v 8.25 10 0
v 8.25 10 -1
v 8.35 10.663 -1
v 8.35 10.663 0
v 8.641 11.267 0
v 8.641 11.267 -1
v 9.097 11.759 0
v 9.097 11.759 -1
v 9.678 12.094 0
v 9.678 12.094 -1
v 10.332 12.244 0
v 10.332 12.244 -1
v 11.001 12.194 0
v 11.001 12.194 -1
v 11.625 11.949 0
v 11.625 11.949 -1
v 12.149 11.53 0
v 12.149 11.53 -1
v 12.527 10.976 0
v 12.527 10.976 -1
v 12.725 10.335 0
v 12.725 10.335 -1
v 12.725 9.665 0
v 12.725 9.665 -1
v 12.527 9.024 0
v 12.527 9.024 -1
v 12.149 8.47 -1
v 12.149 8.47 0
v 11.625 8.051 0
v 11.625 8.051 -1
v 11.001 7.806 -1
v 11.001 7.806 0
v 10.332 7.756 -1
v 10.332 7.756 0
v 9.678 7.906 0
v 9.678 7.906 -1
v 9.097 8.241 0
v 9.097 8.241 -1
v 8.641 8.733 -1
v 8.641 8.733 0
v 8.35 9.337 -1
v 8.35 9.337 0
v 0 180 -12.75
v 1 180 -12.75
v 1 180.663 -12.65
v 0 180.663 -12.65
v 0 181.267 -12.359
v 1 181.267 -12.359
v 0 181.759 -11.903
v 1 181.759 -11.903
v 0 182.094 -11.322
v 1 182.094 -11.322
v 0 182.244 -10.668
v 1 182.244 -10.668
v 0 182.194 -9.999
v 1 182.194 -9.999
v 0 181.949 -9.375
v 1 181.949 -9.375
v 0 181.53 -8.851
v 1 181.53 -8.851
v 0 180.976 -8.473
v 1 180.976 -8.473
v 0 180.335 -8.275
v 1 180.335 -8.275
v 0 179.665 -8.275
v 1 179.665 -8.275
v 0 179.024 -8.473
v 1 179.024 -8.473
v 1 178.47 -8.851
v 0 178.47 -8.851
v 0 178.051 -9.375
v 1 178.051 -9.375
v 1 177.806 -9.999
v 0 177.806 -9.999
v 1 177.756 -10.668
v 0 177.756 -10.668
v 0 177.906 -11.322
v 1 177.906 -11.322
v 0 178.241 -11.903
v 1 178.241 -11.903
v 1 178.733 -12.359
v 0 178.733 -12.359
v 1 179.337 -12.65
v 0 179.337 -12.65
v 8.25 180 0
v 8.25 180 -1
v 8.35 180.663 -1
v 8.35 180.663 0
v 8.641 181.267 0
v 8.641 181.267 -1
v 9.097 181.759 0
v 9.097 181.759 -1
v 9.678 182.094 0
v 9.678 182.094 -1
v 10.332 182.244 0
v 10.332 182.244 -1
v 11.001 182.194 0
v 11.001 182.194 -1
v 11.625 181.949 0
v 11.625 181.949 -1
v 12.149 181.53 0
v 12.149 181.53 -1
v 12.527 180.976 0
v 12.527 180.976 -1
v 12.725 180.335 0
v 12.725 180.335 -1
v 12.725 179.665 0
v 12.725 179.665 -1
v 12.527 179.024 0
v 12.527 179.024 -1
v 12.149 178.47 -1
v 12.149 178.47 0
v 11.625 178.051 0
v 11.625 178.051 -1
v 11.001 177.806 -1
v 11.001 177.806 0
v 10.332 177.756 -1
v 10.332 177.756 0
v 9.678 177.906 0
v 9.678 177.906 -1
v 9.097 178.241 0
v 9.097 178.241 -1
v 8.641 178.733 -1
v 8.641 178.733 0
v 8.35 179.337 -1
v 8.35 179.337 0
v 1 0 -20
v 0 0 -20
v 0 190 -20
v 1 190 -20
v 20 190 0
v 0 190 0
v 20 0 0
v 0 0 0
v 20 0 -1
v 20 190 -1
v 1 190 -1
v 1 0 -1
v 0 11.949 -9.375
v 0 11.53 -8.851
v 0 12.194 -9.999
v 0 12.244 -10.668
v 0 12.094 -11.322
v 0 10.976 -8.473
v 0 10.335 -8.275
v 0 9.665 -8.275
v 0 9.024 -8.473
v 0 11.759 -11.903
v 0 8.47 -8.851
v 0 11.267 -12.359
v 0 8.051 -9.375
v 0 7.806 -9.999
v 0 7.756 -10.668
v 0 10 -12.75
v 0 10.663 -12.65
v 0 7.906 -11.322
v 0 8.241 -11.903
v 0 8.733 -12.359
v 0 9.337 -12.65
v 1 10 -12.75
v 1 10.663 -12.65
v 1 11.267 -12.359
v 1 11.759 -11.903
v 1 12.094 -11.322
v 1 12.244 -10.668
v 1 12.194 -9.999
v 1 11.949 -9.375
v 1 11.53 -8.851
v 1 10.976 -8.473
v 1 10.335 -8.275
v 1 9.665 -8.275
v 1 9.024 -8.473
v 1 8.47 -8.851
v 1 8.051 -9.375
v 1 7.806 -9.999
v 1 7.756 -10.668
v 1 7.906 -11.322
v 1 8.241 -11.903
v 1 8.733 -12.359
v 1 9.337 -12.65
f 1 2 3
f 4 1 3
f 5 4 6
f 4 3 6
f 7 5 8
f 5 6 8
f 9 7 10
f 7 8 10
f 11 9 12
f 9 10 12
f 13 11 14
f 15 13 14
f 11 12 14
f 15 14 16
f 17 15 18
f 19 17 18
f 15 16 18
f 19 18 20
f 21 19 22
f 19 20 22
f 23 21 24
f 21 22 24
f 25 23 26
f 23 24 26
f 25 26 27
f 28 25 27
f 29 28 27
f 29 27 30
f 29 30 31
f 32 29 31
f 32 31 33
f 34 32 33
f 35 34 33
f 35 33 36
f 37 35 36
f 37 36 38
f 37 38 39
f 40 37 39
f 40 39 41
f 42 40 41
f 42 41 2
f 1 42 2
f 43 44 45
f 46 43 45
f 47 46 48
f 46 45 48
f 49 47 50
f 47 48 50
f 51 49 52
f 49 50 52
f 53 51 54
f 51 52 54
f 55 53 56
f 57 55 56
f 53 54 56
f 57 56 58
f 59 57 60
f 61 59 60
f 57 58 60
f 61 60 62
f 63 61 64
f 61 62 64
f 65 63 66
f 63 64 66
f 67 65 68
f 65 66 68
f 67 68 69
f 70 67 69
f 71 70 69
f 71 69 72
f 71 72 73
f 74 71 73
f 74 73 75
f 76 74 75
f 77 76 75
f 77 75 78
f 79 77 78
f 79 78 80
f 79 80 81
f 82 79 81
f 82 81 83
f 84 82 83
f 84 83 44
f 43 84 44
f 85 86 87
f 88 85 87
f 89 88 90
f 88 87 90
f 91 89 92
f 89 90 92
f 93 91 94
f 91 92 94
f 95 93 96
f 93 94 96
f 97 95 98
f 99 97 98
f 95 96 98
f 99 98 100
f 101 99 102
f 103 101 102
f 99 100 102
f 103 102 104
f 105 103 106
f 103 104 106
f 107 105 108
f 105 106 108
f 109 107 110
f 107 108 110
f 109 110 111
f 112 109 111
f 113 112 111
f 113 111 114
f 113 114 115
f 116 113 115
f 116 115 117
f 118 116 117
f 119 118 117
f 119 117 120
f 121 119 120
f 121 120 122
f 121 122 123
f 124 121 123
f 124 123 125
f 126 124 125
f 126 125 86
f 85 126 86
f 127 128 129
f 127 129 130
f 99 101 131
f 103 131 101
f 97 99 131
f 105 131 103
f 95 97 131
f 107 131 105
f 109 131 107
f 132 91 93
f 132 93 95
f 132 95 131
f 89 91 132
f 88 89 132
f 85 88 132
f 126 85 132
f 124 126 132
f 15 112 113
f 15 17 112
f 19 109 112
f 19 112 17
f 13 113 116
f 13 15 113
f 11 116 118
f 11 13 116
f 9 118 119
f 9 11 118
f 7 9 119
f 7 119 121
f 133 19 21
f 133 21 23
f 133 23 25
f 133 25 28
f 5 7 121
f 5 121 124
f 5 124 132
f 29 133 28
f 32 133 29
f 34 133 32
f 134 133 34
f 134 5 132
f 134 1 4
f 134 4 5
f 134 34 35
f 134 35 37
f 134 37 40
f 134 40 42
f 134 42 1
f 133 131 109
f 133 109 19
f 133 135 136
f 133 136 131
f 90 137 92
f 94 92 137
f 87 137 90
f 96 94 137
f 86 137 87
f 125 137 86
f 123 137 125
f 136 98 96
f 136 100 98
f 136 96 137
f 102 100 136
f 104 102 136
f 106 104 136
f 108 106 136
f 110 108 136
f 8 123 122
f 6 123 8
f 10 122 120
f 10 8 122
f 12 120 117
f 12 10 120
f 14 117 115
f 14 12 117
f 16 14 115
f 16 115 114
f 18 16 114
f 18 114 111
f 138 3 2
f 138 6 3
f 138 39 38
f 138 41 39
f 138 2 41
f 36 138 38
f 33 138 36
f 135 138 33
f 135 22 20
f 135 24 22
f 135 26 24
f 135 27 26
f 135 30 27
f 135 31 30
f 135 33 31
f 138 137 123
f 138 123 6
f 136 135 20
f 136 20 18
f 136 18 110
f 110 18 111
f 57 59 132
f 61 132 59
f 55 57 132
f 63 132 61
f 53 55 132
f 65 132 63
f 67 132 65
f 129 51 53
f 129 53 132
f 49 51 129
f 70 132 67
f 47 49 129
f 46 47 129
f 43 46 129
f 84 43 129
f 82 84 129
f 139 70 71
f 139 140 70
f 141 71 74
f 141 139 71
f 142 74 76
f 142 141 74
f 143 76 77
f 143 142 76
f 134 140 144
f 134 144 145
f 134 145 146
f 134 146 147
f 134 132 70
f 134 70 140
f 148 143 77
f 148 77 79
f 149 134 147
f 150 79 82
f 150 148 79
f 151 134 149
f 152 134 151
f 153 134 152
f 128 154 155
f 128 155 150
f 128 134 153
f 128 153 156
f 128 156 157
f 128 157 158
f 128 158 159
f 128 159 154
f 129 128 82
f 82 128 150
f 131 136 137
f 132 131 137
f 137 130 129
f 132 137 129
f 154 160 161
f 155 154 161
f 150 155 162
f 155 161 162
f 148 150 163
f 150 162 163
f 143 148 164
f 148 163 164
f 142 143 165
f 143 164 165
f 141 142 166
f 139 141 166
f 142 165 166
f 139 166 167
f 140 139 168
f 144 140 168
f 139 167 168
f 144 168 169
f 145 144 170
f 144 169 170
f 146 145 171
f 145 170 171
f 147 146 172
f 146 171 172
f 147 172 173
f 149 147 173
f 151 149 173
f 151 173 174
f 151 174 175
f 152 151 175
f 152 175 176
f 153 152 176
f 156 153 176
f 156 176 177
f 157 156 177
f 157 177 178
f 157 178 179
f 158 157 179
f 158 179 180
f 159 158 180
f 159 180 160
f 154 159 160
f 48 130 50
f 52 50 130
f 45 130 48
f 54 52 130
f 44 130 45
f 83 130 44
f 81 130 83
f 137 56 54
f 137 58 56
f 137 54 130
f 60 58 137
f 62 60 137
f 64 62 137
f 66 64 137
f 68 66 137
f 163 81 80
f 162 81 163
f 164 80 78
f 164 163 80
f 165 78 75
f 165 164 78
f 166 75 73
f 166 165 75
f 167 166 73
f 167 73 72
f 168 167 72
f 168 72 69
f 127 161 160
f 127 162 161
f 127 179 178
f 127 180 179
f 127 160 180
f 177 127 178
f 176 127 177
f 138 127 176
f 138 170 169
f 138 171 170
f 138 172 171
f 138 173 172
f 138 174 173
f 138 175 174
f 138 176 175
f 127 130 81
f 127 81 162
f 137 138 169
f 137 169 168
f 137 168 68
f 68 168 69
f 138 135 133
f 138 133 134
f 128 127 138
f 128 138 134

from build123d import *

# Parameters (mm, degrees)
EXTRUDE_1_DEPTH     = 190
SKETCH_2_R          = 2.25
CUT_EXTRUDE_1_DEPTH = 2
SKETCH_3_R          = 2.25
CUT_EXTRUDE_2_DEPTH = 2


with BuildPart() as part:
    # Эскиз1 → Бобышка-Вытянуть1 (new body)
    with BuildSketch(Plane(origin=(0, 0, 0), x_dir=(1, 0, 0), z_dir=(0, 1, 0))):
        Polygon((0, 0), (0, 20), (1, 20), (1, 1), (20, 1), (20, 0), align=None)
    extrude(amount=EXTRUDE_1_DEPTH)

    # Эскиз2 → Вырез-Вытянуть1 (cut, through all)
    with BuildSketch(Plane(origin=(1, 0, 0), x_dir=(0, 0, -1), z_dir=(1, 0, 0))):
        with Locations((10.5, 10)):
            Circle(SKETCH_2_R)
        with Locations((10.5, 180)):
            Circle(SKETCH_2_R)
    extrude(amount=-CUT_EXTRUDE_1_DEPTH, mode=Mode.SUBTRACT)

    # Эскиз3 → Вырез-Вытянуть2 (cut, through all)
    with BuildSketch(Plane(origin=(0, 0, -1), x_dir=(-1, 0, 0), z_dir=(0, 0, -1))):
        with Locations((-10.5, 180)):
            Circle(SKETCH_3_R)
        with Locations((-10.5, 10)):
            Circle(SKETCH_3_R)
    extrude(amount=-CUT_EXTRUDE_2_DEPTH, mode=Mode.SUBTRACT)


solid = part.part
